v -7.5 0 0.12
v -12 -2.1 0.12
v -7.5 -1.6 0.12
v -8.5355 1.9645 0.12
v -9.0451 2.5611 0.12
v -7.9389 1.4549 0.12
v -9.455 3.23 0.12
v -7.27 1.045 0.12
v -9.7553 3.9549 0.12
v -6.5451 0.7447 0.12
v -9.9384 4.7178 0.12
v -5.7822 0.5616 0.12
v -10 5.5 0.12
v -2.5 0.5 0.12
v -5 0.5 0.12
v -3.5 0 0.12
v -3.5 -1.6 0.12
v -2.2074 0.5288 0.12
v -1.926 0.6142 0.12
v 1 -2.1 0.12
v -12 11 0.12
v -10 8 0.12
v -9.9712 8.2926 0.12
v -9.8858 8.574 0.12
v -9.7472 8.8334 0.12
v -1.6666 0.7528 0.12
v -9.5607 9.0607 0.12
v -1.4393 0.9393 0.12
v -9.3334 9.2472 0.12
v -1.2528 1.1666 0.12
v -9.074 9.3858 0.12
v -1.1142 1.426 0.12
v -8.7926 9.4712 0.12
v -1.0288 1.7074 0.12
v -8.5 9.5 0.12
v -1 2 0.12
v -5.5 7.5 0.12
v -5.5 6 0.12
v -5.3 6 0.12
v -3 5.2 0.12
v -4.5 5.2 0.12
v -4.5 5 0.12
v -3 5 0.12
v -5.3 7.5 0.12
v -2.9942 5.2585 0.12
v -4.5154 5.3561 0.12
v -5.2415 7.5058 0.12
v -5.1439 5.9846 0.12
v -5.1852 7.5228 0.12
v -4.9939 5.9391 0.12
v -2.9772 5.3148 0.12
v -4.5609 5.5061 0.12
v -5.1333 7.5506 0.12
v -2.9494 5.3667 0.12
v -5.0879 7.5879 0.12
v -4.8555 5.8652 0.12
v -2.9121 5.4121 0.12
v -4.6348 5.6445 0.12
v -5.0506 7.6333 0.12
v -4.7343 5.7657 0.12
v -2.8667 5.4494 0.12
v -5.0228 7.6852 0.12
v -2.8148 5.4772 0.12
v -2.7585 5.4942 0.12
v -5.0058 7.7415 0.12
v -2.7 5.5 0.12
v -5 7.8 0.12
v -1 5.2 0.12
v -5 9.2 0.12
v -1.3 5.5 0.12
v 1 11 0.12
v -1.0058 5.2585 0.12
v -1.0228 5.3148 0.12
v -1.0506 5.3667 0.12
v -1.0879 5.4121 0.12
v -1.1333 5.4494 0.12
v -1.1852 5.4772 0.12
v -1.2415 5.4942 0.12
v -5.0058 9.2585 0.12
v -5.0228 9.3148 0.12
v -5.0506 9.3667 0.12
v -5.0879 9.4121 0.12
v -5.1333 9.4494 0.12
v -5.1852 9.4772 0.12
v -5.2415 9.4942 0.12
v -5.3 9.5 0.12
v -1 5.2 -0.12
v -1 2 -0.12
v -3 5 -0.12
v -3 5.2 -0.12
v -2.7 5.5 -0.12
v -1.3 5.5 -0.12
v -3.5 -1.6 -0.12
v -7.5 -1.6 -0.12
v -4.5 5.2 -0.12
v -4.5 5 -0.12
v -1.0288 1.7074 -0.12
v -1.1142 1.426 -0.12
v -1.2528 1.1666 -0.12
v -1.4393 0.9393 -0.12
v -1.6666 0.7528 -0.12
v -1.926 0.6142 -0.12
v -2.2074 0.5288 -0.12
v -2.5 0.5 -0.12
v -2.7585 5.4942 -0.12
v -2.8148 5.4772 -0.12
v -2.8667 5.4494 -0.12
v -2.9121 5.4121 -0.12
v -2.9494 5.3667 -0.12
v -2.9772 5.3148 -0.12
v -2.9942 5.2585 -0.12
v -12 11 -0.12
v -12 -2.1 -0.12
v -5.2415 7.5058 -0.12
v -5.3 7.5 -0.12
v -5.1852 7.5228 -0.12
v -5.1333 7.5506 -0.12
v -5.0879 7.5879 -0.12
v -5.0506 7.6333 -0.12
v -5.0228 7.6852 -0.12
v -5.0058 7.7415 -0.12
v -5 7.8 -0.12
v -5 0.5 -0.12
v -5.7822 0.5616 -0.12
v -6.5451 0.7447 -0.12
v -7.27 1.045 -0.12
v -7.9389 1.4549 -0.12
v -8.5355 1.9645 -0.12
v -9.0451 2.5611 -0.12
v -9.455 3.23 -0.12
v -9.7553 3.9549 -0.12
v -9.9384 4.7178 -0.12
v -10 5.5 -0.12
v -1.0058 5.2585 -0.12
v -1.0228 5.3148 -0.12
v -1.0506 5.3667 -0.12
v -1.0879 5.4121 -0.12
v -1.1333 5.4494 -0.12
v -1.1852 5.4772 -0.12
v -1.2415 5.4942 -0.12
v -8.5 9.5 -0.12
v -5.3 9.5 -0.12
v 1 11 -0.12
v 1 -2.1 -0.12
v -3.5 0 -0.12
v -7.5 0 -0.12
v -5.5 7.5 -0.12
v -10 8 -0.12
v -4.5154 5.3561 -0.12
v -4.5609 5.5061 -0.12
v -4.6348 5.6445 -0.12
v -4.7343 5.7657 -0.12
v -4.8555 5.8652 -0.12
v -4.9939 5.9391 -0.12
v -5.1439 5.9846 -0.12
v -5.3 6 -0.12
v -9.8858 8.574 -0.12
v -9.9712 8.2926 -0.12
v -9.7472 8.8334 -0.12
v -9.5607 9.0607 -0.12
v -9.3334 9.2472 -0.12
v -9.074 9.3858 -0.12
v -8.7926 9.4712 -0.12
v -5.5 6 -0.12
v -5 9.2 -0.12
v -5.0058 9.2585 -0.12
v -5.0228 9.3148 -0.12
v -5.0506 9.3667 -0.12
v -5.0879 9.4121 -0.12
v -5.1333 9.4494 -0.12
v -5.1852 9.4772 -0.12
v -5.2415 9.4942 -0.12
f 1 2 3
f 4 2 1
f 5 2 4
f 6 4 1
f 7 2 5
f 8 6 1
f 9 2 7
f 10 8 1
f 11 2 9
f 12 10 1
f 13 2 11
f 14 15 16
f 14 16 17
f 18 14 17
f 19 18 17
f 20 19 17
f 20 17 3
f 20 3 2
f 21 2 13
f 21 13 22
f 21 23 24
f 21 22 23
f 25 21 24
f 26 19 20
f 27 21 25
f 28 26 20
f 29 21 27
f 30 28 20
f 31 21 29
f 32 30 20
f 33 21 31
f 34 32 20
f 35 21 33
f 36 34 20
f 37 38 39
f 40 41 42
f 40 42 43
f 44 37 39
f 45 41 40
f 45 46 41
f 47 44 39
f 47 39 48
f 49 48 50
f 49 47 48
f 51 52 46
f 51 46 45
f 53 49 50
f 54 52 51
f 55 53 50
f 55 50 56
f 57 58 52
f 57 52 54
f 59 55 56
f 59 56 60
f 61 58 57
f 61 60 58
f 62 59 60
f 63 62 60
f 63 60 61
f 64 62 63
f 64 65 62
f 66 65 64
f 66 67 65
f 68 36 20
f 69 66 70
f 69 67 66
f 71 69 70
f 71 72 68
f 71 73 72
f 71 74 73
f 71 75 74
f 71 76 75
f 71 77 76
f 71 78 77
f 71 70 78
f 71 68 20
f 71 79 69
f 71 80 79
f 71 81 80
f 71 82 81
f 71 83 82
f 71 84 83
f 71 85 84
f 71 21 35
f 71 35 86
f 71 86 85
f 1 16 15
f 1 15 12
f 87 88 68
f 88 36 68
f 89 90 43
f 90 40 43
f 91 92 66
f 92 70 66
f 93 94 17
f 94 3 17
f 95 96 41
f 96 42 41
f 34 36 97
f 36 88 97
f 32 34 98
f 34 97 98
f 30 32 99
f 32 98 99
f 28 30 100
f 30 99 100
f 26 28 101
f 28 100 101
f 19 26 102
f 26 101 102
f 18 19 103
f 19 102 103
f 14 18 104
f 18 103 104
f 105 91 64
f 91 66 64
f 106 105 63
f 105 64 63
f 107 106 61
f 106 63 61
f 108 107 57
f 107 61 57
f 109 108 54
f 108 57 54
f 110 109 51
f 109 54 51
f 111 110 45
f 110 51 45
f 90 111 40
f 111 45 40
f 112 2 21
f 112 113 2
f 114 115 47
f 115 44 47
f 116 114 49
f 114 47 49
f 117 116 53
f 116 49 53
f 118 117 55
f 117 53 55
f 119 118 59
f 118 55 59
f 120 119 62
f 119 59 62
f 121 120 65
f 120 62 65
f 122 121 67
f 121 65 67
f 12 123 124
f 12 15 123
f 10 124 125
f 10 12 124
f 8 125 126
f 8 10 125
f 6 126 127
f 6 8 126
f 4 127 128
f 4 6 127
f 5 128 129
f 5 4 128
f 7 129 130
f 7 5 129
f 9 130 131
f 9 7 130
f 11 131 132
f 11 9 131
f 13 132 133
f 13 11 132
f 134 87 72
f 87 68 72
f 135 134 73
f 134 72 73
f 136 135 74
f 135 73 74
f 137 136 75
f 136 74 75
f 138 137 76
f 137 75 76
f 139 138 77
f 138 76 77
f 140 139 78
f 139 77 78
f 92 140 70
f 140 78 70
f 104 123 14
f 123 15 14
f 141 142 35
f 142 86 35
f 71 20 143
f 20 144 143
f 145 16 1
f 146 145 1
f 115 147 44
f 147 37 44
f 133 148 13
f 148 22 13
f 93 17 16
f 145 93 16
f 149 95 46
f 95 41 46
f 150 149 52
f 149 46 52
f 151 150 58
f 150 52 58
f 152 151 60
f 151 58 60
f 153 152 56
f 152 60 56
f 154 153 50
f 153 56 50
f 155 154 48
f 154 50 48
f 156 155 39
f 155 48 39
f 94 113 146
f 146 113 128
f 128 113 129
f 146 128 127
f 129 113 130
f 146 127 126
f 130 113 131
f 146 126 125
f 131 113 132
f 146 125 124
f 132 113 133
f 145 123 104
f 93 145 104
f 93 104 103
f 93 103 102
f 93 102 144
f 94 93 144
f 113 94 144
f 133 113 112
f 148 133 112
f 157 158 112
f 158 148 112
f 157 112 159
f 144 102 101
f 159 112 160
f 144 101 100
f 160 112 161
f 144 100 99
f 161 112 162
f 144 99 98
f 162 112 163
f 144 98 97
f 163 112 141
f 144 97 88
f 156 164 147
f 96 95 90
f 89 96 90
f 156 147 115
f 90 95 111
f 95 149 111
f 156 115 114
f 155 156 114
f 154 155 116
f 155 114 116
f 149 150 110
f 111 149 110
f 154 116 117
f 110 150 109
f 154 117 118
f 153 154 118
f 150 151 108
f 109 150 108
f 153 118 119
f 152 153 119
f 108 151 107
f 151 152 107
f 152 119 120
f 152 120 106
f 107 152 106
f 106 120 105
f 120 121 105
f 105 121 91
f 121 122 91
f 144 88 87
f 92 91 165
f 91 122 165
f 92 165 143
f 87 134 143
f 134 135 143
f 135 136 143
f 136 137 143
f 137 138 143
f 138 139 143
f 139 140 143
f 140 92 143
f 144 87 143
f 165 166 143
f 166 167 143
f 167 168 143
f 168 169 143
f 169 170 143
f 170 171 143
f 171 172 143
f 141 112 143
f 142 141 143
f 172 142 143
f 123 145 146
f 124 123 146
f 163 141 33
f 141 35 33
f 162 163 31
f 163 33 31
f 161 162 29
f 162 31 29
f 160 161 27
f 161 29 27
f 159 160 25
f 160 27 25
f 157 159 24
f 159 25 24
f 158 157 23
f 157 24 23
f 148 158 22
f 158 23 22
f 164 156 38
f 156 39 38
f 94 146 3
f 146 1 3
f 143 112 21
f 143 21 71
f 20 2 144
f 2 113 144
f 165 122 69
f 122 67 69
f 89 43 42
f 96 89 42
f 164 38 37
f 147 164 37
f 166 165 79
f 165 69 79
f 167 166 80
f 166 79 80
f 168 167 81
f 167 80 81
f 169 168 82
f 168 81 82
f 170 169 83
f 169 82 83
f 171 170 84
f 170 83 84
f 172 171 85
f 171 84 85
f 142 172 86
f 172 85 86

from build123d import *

# Parameters (mm, degrees)
BOSS_EXTRUDE1_DEPTH = 0.12
FILLET2_R           = 1.5
FILLET3_R           = 5
BOSS_EXTRUDE2_DEPTH = 0.12
SKETCH5_W           = 1
SKETCH5_H           = 13.1
SKETCH5_W_2         = 2.922992305
SKETCH5_H_2         = 2.818599723
BOSS_EXTRUDE3_DEPTH = 0.12
FILLET5_R           = 0.3
FILLET6_R           = 0.8


with BuildPart() as part:
    # Sketch1 → Boss-Extrude1 (new, symmetric)
    with BuildSketch(Plane.XY):
        Polygon((0, 0), (-11, 0), (-11, 10.5), (-11, 11), (0, 11), (0, 10.5), align=None)
        Polygon((-1, 0.5), (-1, 5.5), (-3, 5.5), (-3, 5), (-4.5, 5), (-4.5, 6), (-5.5, 6), (-5.5, 7.5), (-5, 7.5), (-5, 9.5), (-10, 9.5), (-10, 0.5), align=None, mode=Mode.SUBTRACT)
    extrude(amount=BOSS_EXTRUDE1_DEPTH, both=True)

    # Fillet2
    fillet2_edges = [part.edges().sort_by_distance(p)[0] for p in [
        (-1, 0.5, 0),
        (-10, 9.5, 0),
    ]]
    fillet(fillet2_edges, radius=FILLET2_R)

    # Fillet3
    fillet3_edges = [part.edges().sort_by_distance(p)[0] for p in [
        (-10, 0.5, 0),
    ]]
    fillet(fillet3_edges, radius=FILLET3_R)

    # Sketch4 → Boss-Extrude2 (add, symmetric)
    with BuildSketch(Plane.XY):
        Polygon((0, 0), (0, -2.1), (-11, -2.1), (-11, 0), (-7.5, 0), (-7.5, -1.6), (-3.5, -1.6), (-3.5, 0), align=None)
    extrude(amount=BOSS_EXTRUDE2_DEPTH, both=True)

    # Sketch5 → Boss-Extrude3 (add, symmetric)
    with BuildSketch(Plane.XY):
        with Locations((-11.5, 4.45)):
            Rectangle(SKETCH5_W, SKETCH5_H)
        with Locations((0.5, 4.45)):
            Rectangle(SKETCH5_W, SKETCH5_H)
        with Locations((-1.978875572, 8.357232245)):
            Rectangle(SKETCH5_W_2, SKETCH5_H_2)
    extrude(amount=BOSS_EXTRUDE3_DEPTH, both=True)

    # Fillet5
    fillet5_edges = [part.edges().sort_by_distance(p)[0] for p in [
        (-1, 5.5, 0),
        (-3, 5.5, 0),
        (-5, 7.5, 0),
        (-5, 9.5, 0),
    ]]
    fillet(fillet5_edges, radius=FILLET5_R)

    # Fillet6
    fillet6_edges = [part.edges().sort_by_distance(p)[0] for p in [
        (-4.5, 6, 0),
    ]]
    fillet(fillet6_edges, radius=FILLET6_R)


solid = part.part
